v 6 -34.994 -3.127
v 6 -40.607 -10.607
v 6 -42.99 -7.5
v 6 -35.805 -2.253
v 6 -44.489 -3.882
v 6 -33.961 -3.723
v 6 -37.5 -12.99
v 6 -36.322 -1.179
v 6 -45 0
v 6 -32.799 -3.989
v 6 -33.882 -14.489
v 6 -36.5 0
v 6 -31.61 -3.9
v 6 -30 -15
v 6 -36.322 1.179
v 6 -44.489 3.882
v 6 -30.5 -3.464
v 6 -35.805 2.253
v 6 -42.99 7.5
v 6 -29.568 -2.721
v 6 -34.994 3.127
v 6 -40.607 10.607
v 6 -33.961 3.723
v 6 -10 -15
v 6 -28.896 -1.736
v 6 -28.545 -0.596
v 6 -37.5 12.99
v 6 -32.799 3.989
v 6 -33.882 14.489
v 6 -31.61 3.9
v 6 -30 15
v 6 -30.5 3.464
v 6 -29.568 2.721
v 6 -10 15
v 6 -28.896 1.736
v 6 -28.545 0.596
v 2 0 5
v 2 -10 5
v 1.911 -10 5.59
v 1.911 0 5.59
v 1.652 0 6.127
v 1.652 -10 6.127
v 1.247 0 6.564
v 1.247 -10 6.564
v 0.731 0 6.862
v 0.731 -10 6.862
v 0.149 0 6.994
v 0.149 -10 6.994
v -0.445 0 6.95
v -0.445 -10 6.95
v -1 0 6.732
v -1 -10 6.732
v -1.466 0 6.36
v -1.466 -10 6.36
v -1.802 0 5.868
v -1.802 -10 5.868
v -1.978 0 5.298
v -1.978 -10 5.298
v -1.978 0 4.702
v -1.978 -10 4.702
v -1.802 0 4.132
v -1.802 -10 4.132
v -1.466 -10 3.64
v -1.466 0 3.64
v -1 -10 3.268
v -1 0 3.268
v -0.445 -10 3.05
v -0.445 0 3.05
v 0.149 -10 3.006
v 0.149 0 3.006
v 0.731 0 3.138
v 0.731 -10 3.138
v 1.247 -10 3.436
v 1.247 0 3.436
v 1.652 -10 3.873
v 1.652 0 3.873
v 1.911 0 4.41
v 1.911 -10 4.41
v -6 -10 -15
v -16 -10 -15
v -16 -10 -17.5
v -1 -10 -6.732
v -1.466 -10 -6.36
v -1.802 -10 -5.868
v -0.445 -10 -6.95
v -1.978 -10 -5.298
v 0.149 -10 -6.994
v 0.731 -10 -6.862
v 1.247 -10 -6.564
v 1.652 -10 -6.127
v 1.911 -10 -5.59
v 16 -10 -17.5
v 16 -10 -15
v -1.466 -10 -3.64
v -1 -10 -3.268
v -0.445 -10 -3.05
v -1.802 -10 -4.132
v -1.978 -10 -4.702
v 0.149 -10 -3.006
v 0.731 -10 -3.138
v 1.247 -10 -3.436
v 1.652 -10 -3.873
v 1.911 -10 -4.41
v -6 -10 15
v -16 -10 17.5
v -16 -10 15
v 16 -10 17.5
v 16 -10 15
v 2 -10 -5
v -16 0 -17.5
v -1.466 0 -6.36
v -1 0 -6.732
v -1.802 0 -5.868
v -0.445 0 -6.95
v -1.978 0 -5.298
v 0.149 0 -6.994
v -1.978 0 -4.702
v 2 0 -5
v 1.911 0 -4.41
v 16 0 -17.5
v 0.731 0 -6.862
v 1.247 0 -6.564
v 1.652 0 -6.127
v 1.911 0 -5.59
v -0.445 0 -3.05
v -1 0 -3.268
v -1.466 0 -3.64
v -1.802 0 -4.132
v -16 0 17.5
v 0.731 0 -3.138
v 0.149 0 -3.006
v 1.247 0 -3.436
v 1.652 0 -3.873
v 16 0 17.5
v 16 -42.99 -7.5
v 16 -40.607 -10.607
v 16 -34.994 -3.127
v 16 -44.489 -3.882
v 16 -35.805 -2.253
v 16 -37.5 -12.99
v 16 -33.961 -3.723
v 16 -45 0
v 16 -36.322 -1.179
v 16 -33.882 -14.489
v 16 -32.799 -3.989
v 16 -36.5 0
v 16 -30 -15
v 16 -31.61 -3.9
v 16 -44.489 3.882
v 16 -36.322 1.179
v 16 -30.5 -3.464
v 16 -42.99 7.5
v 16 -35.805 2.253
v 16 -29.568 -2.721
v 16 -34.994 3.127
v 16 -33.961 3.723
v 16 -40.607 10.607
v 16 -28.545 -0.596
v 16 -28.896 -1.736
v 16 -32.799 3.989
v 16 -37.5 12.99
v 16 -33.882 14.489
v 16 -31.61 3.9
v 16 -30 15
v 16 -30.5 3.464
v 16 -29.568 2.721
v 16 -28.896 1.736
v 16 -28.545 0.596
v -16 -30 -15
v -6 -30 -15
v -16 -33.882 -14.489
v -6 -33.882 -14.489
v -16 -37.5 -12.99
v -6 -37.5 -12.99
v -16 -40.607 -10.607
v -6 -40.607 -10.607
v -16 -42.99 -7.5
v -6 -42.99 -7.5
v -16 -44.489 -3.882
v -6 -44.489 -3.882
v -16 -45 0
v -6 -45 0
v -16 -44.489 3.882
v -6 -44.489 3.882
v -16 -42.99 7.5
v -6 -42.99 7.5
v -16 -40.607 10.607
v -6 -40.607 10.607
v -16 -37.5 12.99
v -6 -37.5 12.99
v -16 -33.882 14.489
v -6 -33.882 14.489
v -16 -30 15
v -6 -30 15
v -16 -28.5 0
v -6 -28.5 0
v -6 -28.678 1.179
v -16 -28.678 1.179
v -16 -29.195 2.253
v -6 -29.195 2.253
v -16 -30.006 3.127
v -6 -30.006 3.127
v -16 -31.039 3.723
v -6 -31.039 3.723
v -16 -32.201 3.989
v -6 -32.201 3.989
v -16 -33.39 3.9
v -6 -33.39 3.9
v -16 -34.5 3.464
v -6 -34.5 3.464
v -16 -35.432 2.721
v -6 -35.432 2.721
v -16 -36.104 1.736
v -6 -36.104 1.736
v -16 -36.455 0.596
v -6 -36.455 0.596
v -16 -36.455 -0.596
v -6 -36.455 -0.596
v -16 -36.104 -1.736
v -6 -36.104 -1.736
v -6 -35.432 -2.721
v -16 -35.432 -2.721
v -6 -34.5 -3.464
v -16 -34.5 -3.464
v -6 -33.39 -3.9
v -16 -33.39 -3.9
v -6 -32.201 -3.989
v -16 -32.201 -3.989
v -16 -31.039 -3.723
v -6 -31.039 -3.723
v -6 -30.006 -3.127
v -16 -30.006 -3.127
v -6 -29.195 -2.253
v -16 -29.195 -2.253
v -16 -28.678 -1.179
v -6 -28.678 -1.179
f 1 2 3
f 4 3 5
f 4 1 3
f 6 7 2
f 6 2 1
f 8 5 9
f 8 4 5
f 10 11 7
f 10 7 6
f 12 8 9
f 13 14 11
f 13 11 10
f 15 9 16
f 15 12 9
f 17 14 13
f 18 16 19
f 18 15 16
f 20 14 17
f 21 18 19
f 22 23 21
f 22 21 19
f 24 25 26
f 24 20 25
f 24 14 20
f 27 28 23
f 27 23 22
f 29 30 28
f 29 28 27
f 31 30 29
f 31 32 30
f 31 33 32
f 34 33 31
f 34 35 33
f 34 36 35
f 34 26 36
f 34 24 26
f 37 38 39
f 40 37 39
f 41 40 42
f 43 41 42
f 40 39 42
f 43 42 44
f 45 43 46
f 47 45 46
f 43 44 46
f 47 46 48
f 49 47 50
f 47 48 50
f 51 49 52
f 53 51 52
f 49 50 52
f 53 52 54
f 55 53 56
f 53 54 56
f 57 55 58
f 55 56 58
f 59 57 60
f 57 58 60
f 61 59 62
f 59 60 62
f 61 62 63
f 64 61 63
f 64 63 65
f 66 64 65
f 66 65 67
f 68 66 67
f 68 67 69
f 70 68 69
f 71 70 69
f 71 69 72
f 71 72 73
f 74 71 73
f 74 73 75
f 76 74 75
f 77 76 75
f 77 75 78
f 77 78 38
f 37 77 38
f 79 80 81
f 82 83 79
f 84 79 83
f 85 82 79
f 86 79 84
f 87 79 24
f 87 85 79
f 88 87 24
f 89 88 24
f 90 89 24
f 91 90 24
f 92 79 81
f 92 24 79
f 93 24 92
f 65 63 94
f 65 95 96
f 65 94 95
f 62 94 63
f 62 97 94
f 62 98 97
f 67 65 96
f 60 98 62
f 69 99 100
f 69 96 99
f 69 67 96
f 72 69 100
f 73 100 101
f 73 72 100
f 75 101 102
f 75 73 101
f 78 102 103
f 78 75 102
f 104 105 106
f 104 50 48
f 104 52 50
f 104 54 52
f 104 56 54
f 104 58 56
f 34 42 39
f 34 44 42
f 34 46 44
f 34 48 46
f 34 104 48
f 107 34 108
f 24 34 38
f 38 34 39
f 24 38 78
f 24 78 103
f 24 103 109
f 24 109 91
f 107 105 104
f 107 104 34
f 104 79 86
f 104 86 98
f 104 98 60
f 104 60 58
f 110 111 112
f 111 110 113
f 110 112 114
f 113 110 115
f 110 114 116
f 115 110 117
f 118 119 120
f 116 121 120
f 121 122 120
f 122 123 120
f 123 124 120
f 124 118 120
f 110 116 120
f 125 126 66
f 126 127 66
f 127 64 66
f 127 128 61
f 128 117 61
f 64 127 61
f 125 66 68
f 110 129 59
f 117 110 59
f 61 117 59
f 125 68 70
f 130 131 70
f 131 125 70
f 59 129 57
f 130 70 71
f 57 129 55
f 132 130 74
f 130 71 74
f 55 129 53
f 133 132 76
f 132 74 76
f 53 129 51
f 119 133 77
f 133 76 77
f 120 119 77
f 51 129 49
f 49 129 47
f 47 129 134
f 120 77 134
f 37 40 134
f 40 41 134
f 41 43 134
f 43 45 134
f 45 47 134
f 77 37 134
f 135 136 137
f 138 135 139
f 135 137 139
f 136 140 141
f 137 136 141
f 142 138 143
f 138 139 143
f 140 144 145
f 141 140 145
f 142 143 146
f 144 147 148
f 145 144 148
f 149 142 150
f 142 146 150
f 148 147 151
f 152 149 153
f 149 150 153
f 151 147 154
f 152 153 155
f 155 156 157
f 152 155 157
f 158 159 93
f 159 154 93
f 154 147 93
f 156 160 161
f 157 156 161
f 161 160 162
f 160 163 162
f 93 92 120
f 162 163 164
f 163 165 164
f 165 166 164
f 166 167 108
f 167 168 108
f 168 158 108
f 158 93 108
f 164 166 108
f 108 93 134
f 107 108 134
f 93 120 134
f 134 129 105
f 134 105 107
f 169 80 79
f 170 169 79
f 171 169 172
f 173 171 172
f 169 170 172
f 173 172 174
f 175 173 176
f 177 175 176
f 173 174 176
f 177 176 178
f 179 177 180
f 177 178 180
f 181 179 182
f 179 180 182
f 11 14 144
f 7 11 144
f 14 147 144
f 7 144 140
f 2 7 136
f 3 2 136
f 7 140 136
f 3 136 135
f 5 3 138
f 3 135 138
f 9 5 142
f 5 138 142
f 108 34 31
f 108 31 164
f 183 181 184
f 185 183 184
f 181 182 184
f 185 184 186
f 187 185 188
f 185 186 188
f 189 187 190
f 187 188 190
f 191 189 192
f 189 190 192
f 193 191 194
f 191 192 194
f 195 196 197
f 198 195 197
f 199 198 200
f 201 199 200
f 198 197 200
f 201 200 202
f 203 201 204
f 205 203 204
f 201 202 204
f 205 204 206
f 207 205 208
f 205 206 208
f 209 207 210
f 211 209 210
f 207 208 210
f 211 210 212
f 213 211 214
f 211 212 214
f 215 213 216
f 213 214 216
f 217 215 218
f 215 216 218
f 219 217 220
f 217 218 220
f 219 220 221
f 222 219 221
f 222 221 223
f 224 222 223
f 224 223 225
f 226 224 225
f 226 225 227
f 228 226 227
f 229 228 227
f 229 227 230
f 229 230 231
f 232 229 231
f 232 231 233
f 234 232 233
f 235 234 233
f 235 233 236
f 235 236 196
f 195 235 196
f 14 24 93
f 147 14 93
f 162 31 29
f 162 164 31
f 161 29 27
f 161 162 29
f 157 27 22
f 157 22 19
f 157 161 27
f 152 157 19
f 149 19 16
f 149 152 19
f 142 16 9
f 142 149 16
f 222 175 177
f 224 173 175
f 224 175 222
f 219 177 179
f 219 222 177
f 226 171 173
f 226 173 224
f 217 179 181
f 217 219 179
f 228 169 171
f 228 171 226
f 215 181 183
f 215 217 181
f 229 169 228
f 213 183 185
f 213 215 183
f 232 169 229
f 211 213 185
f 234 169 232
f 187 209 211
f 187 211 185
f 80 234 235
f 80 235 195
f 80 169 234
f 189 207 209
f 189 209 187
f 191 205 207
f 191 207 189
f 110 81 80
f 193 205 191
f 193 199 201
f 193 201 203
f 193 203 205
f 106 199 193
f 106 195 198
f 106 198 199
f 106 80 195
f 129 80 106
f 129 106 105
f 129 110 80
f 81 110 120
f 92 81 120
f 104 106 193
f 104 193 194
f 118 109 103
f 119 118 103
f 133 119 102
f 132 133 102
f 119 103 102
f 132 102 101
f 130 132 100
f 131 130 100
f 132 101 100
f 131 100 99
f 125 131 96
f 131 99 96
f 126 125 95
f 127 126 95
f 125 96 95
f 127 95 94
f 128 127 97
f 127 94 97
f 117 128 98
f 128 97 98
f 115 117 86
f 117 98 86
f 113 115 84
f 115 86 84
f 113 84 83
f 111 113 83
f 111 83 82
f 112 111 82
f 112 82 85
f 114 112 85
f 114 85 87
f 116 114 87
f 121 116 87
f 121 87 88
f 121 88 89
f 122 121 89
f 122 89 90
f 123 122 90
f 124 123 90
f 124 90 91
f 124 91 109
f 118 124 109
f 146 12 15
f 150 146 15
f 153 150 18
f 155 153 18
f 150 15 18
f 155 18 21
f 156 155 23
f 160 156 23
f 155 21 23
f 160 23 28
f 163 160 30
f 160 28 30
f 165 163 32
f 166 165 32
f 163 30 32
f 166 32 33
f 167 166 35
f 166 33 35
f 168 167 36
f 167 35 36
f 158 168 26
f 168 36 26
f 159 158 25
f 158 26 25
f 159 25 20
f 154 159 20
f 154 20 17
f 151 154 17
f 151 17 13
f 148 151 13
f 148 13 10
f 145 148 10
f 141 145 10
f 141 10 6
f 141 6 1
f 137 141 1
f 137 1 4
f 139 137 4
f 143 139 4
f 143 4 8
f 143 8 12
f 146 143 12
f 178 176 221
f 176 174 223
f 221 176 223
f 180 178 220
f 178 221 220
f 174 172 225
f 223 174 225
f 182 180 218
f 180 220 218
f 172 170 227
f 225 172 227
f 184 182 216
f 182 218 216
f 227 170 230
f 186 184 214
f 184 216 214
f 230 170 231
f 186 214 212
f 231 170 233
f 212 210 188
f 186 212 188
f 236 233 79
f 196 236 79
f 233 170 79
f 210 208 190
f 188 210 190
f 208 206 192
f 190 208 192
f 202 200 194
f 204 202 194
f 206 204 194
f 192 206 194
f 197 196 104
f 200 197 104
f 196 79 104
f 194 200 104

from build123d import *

# Parameters (mm, degrees)
F0_W      = 32
F0_H      = 35
F1_DEPTH  = 10
F2_W      = 10
F2_H      = 30
F3_DEPTH  = 35
F4_R      = 4
F5_DEPTH  = 10.001
F6_R      = 4
F7_DEPTH  = 10.001
F8_R      = 14.99999
F9_R      = 2
F10_DEPTH = 10.001


# Not quite as in the source:
# - a fillet or chamfer is up to 0.001 mm smaller than in the source, because OpenCascade refuses the exact size


with BuildPart() as f1:
    # F0 (on Front) → F1 (new body)
    with BuildSketch(Plane.XZ):
        Rectangle(F0_W, F0_H)
    extrude(amount=F1_DEPTH)

    # F2 (on face) → F3 (join)
    with BuildSketch(Plane.XZ.offset(10)):
        with Locations((-11, 0)):
            Rectangle(F2_W, F2_H)
        with Locations((11, 0)):
            Rectangle(F2_W, F2_H)
    extrude(amount=F3_DEPTH)

    # F4 (on face) → F5 (cut, through all)
    with BuildSketch(Plane.YZ.offset(-6)):
        with Locations((-32.5, 0)):
            Circle(F4_R)
    extrude(amount=-F5_DEPTH, mode=Mode.SUBTRACT)

    # F6 (on face) → F7 (cut, through all)
    with BuildSketch(Plane(origin=(6, 0, 0), x_dir=(0, -1, 0), z_dir=(-1, 0, 0))):
        with Locations((32.5, 0)):
            Circle(F6_R)
    extrude(amount=-F7_DEPTH, mode=Mode.SUBTRACT)

    # F8 (radius 15 in the source; OpenCascade refuses exactly that, so slightly less here)
    f8_edges = [f1.edges().sort_by_distance(p)[0] for p in [
        (-11, -45, -15),
        (11, -45, -15),
        (-11, -45, 15),
        (11, -45, 15),
    ]]
    fillet(f8_edges, radius=F8_R)

    # F9 (on face) → F10 (cut, through all)
    with BuildSketch(Plane.XZ.offset(10)):
        with Locations((0, 5)):
            Circle(F9_R)
        with Locations((0, -5)):
            Circle(F9_R)
    extrude(amount=-F10_DEPTH, mode=Mode.SUBTRACT)


solid = f1.part
